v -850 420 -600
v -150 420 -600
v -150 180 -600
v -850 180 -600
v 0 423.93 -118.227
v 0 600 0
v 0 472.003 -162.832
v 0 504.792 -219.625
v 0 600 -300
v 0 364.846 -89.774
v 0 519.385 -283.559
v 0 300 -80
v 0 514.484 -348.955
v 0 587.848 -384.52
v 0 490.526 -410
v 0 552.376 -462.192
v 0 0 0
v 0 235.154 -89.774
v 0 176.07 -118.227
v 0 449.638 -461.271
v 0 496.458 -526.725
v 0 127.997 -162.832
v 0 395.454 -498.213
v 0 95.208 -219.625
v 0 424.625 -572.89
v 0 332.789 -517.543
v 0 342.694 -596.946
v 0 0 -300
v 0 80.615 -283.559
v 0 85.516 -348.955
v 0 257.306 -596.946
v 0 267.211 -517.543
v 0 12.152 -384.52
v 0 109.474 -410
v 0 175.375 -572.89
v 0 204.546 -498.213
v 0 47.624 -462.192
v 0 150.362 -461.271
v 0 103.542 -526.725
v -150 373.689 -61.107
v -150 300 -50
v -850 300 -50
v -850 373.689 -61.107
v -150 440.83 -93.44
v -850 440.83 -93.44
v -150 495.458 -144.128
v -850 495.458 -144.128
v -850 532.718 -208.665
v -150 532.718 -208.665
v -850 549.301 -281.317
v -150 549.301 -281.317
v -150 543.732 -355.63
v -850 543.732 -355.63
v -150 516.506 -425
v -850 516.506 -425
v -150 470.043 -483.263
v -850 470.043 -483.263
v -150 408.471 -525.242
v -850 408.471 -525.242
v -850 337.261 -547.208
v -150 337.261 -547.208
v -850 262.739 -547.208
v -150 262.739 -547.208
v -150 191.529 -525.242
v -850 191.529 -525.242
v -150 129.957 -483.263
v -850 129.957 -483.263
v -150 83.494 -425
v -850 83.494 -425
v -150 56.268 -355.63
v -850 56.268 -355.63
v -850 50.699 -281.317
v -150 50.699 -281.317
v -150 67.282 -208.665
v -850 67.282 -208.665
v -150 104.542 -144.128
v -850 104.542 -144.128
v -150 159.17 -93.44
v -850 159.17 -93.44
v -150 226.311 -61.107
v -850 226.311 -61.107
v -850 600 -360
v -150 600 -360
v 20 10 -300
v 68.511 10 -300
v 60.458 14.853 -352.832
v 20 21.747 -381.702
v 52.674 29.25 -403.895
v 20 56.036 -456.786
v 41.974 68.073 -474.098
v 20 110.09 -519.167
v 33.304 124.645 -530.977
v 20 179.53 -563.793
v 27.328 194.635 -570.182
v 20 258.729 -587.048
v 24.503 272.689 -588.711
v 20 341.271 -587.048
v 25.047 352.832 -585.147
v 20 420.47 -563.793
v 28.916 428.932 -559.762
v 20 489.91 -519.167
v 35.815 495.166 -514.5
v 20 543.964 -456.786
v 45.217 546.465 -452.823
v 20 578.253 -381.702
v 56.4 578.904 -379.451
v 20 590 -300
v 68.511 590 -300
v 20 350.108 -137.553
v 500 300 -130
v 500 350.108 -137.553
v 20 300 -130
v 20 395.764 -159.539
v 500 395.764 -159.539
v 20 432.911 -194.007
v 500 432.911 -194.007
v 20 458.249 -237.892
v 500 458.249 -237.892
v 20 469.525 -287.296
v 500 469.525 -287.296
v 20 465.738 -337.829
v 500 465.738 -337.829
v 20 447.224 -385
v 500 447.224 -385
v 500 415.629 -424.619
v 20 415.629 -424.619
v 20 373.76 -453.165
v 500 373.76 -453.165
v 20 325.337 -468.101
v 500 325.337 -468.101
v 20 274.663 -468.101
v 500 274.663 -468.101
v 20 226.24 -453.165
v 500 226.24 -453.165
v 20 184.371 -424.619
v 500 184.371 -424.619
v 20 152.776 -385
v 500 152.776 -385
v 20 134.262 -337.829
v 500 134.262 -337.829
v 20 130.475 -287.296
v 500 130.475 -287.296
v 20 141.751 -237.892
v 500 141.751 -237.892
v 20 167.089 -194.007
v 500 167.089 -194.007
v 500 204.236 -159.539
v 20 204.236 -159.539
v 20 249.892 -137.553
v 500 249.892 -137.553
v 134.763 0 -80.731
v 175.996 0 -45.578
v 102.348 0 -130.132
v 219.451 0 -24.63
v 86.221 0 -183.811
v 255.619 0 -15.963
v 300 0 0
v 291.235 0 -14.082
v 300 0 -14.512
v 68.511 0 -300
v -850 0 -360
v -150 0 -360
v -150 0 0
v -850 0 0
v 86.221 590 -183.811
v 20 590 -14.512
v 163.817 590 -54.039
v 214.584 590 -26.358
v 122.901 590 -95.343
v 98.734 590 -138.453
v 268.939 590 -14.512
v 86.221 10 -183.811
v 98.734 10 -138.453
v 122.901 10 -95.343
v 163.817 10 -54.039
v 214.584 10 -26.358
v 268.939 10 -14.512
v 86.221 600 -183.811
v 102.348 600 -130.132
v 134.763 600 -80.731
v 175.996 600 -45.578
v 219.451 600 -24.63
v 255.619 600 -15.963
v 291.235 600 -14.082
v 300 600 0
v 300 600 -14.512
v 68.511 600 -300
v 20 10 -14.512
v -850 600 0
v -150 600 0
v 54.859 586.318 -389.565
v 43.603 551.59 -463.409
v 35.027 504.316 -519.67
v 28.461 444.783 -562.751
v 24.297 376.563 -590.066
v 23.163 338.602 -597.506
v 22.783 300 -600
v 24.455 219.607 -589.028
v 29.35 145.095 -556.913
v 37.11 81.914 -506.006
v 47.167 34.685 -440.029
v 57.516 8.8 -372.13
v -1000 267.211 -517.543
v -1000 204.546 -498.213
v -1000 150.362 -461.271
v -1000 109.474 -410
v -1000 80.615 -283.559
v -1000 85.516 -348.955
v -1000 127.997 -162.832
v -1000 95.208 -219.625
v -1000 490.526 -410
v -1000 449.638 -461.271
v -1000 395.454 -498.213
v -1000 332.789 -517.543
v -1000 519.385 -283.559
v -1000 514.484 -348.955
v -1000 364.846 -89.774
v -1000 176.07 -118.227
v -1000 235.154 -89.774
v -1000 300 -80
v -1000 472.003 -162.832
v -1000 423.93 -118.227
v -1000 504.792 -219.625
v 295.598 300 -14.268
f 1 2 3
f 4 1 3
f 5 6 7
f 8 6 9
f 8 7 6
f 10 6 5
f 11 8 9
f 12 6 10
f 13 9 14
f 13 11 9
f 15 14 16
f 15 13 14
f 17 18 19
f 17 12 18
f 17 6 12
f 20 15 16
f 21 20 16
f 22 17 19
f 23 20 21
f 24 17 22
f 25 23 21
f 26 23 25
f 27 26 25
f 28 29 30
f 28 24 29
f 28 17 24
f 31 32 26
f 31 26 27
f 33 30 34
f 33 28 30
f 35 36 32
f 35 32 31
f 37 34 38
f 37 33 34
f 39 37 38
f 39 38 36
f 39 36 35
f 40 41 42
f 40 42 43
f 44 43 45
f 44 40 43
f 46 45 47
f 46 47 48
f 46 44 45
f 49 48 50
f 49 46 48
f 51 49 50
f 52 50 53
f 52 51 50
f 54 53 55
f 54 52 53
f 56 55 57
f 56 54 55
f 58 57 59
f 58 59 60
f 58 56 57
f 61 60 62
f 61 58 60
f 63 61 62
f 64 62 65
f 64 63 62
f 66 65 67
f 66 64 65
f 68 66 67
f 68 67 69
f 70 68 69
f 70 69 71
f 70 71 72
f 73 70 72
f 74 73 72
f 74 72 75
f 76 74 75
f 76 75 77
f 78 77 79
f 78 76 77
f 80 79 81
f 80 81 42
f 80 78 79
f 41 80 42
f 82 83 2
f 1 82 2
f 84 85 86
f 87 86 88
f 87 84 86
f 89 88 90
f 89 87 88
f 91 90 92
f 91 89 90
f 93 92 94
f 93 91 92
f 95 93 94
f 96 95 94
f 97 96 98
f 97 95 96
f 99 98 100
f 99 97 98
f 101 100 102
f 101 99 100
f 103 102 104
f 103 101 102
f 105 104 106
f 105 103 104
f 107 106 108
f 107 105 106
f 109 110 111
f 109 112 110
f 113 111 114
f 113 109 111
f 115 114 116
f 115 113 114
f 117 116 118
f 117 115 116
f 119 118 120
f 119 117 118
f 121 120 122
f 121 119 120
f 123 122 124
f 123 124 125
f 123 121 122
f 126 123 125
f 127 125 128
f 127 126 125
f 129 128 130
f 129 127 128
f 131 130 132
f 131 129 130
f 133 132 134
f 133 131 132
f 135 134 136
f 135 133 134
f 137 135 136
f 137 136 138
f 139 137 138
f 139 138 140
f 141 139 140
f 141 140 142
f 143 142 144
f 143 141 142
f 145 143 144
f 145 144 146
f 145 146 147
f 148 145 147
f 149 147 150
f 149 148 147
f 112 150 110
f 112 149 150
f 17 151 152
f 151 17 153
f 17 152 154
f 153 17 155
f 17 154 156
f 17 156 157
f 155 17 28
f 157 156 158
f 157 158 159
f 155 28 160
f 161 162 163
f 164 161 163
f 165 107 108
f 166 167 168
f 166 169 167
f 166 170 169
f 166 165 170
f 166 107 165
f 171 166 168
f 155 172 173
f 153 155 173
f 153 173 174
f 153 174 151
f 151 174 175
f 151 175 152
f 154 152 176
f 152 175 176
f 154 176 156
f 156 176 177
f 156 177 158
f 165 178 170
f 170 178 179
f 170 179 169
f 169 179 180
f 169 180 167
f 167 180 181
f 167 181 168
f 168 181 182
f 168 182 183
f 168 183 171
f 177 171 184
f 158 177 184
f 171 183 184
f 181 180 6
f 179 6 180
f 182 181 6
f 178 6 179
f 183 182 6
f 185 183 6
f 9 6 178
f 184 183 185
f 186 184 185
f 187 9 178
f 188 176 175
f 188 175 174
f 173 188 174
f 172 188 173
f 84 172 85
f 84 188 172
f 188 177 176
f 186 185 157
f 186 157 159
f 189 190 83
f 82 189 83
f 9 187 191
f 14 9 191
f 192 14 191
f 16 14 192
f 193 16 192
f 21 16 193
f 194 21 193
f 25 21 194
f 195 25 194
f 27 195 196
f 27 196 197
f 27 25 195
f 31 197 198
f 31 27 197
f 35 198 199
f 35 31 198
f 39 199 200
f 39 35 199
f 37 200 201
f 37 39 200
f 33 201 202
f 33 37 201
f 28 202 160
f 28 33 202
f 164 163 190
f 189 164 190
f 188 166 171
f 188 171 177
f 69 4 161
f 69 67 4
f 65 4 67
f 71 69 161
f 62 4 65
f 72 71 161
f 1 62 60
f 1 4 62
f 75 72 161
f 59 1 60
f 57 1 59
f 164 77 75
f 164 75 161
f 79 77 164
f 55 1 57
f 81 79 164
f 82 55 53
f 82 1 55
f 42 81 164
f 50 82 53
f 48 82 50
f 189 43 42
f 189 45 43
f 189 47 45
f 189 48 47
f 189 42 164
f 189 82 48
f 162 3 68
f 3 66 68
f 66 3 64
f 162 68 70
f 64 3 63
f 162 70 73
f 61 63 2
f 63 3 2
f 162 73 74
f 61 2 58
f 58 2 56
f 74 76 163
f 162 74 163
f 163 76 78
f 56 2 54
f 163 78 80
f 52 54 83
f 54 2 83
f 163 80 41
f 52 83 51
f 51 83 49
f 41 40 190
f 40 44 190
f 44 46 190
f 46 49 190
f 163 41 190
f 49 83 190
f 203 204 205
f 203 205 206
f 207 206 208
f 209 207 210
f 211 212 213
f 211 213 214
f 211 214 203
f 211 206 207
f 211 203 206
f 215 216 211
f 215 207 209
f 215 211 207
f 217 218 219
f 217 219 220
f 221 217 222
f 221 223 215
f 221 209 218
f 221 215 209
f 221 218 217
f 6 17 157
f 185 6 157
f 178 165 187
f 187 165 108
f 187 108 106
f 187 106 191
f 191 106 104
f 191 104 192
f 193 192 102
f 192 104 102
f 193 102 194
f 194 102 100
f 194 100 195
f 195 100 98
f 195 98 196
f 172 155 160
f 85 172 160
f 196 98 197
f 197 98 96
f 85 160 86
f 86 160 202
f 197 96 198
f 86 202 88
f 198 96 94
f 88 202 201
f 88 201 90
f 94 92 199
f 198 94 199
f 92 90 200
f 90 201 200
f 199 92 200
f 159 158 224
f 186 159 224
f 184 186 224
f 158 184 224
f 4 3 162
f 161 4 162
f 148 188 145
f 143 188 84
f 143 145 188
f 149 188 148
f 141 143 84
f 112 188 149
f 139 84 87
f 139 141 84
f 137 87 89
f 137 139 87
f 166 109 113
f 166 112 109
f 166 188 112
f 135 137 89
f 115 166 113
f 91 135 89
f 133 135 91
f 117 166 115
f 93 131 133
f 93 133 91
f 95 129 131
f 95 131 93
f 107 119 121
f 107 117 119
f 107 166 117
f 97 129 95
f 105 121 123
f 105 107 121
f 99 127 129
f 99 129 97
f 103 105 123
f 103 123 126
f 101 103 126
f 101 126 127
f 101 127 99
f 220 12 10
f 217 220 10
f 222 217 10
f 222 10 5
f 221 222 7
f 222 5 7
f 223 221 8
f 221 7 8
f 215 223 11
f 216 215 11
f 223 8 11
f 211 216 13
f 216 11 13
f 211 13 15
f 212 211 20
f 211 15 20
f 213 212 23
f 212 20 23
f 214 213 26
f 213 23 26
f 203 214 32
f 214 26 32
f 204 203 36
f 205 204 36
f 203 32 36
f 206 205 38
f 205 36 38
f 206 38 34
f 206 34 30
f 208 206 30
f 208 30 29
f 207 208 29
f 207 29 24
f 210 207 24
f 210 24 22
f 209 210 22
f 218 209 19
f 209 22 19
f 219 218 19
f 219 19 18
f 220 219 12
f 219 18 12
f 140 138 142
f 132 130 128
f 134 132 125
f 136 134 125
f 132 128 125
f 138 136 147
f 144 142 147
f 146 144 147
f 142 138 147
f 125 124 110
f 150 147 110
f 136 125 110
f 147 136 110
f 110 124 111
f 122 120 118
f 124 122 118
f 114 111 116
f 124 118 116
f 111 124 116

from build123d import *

# Parameters (mm, degrees)
SKETCH1_W           = 300
SKETCH1_H           = 600
BOSS_EXTRUDE1_DEPTH = 600
SKETCH3_OUTSIDE_W   = 782
SKETCH3_OUTSIDE_H   = 782
CUT_EXTRUDE1_DEPTH  = 901
CUT_EXTRUDE2_DEPTH  = 901
FILLET1_R           = 200
SKETCH5_R           = 220
BOSS_EXTRUDE2_DEPTH = 1000
SKETCH6_R           = 170
BOSS_EXTRUDE3_DEPTH = 500
CUT_EXTRUDE3_START  = -280
SKETCH7_R           = 170
CUT_EXTRUDE3_DEPTH  = 280
SKETCH8_R           = 250
BOSS_EXTRUDE4_DEPTH = 700


with BuildPart() as part:
    # Sketch1 → Boss-Extrude1 (new body)
    with BuildSketch(Plane(origin=(0, 0, 0), x_dir=(1, 0, 0), z_dir=(0, 1, 0))):
        with Locations((150, 300)):
            Rectangle(SKETCH1_W, SKETCH1_H)
    extrude(amount=BOSS_EXTRUDE1_DEPTH)

    # Sketch3 outside → Cut-Extrude1 (cut, through all)
    with BuildSketch(Plane.ZY):
        with Locations((-300, 300)):
            Rectangle(SKETCH3_OUTSIDE_W, SKETCH3_OUTSIDE_H)
        with BuildLine():
            Line((0, 600), (-300, 600))
            ThreePointArc((-300, 600), (-600, 300), (-300, 0))
            Line((-300, 0), (0, 0))
            Line((0, 0), (0, 600))
        make_face(mode=Mode.SUBTRACT)
    extrude(amount=-CUT_EXTRUDE1_DEPTH, mode=Mode.SUBTRACT)

    # Sketch4 → Cut-Extrude2 (cut, through all)
    with BuildSketch(Plane.XZ):
        with BuildLine():
            Line((97.914801383, -107.096121744), (22.782668077, -600))
            Line((22.782668077, -600), (300, -600))
            Line((300, -600), (300, -14.511559599))
            add(Edge.make_bspline(
                [(300, -14.511559599), (162.264361077, -6.054695984), (97.914801383, -107.096121744)],
                knots=[0, 0, 0, 1, 1, 1], degree=2))
        make_face()
    extrude(amount=-CUT_EXTRUDE2_DEPTH, mode=Mode.SUBTRACT)

    # Fillet1
    fillet1_edges = [part.edges().sort_by_distance(p)[0] for p in [
        (97.914801383, 300, -107.096121744),
    ]]
    fillet(fillet1_edges, radius=FILLET1_R)

    # Sketch5 → Boss-Extrude2 (add)
    with BuildSketch(Plane.ZY):
        with Locations((-300, 300)):
            Circle(SKETCH5_R)
    extrude(amount=BOSS_EXTRUDE2_DEPTH)

    # Sketch6 → Boss-Extrude3 (add)
    with BuildSketch(Plane.ZY):
        with Locations((-300, 300)):
            Circle(SKETCH6_R)
    extrude(amount=-BOSS_EXTRUDE3_DEPTH)

    # Sketch7 → Cut-Extrude3 (cut)
    with BuildSketch(Plane(origin=(300, 0, 0), x_dir=(0, 0, -1), z_dir=(1, 0, 0)).offset(CUT_EXTRUDE3_START)):
        with BuildLine():
            Line((300, 590), (14.511559599, 590))
            Line((14.511559599, 590), (14.511559599, 300))
            Line((14.511559599, 300), (14.511559599, 10))
            Line((14.511559599, 10), (300, 10))
            ThreePointArc((300, 10), (590, 300), (300, 590))
        make_face()
        with Locations(Location((300, 300, 0), (0, 0, 180))):
            Circle(SKETCH7_R, mode=Mode.SUBTRACT)
    extrude(amount=CUT_EXTRUDE3_DEPTH, mode=Mode.SUBTRACT)


with BuildPart() as body_2:
    # Sketch8 → Boss-Extrude4 (new body)
    with BuildSketch(Plane.ZY.offset(150)):
        Polygon((-360, 600), (-600, 420), (-600, 180), (-360, 0), (0, 0), (0, 600), align=None)
        with Locations((-300, 300)):
            Circle(SKETCH8_R, mode=Mode.SUBTRACT)
    extrude(amount=BOSS_EXTRUDE4_DEPTH)


solid = Compound([part.part, body_2.part])
